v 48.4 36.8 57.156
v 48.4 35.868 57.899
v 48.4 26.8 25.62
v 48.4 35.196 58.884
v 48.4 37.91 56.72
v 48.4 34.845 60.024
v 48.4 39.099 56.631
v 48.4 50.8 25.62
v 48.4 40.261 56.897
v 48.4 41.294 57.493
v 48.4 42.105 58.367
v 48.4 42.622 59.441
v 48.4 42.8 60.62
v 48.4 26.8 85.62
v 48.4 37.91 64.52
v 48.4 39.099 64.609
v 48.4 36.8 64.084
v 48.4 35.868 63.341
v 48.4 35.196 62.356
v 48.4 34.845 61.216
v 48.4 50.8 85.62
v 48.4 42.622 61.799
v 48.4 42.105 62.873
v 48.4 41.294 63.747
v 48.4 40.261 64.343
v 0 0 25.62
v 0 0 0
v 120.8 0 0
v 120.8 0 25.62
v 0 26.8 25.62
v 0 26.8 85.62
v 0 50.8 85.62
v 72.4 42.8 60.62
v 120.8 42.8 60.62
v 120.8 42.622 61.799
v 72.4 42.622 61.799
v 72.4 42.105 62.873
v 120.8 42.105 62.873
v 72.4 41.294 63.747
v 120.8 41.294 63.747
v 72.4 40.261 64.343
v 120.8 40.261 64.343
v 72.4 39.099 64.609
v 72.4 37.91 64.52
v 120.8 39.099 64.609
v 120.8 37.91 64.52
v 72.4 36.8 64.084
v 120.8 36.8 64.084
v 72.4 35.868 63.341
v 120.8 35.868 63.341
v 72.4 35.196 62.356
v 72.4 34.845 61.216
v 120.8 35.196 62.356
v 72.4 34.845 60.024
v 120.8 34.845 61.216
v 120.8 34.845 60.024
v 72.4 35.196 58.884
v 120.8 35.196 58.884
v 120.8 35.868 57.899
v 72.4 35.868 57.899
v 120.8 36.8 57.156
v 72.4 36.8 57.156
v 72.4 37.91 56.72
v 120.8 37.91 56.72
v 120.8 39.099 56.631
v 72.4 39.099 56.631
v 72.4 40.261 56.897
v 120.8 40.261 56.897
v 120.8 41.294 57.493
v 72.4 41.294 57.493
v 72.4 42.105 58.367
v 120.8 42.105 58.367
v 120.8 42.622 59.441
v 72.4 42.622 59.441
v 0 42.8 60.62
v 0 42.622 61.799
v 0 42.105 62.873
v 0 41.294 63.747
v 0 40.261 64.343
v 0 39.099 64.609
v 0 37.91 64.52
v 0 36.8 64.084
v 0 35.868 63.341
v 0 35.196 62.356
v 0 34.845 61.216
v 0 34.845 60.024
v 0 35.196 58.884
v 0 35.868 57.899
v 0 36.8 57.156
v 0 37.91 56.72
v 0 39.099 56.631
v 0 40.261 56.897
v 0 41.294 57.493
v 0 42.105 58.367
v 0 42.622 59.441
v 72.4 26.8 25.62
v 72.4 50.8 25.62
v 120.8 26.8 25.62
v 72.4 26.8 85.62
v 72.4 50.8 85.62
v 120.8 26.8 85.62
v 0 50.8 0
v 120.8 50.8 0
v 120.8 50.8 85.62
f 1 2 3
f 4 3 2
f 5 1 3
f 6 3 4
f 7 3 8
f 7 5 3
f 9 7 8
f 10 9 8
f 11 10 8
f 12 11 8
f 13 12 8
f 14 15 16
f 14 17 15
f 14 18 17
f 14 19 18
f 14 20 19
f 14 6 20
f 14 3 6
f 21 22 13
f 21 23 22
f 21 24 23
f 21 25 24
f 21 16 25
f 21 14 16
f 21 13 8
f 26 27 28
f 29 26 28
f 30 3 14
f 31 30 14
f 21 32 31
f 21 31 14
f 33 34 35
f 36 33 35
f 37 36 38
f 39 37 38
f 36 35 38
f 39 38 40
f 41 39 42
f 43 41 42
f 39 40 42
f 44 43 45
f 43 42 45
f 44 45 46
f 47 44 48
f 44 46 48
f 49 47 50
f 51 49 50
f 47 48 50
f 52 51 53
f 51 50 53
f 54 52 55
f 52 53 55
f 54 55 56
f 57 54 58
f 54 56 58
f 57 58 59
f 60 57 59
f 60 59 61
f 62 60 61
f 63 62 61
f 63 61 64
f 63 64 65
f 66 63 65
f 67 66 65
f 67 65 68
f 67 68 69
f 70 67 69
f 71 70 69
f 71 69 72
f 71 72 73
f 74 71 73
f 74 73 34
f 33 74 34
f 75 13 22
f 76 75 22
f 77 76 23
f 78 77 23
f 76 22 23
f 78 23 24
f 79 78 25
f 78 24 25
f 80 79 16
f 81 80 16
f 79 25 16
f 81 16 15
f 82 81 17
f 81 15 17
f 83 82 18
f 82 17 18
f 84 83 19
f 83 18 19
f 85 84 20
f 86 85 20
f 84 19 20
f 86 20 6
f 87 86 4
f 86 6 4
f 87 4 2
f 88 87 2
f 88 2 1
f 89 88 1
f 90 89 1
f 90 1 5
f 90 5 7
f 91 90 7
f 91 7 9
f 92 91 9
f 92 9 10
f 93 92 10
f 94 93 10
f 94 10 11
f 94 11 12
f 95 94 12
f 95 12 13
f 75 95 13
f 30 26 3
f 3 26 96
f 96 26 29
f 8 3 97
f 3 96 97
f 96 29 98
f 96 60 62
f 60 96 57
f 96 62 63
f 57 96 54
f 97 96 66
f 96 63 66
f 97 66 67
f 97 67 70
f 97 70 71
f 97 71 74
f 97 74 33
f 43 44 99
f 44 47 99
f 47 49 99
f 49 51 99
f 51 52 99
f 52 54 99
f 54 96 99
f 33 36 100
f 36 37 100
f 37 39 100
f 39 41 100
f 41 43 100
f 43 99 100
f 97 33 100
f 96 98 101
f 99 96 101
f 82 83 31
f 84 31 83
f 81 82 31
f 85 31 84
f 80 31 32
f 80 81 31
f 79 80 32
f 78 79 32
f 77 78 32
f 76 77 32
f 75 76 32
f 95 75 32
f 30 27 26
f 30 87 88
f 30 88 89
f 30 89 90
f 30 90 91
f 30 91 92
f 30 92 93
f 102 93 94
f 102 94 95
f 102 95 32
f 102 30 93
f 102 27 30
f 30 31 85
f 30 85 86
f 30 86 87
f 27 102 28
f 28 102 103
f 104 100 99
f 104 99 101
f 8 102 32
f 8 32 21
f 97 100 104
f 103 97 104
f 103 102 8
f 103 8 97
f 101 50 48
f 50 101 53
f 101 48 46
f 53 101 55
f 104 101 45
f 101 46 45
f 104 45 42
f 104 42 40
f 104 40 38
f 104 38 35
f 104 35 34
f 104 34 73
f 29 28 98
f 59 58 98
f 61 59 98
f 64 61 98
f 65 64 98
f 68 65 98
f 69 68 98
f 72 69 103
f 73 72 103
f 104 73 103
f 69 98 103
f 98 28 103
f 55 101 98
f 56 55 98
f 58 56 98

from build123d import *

# Parameters (mm, degrees)
SKETCH1_W           = 120.8
SKETCH1_H           = 50.8
BOSS_EXTRUDE1_DEPTH = 85.62
SKETCH2_W           = 24
SKETCH2_H           = 50.8
CUT_EXTRUDE1_DEPTH  = 60
SKETCH3_R           = 4
CUT_EXTRUDE2_DEPTH  = 121.8
SKETCH4_W           = 26.8
SKETCH4_H           = 60
CUT_EXTRUDE3_DEPTH  = 121.8


with BuildPart() as part:
    # Sketch1 → Boss-Extrude1 (new body)
    with BuildSketch(Plane.XY):
        with Locations((60.4, 25.4)):
            Rectangle(SKETCH1_W, SKETCH1_H)
    extrude(amount=BOSS_EXTRUDE1_DEPTH)

    # Sketch2 → Cut-Extrude1 (cut)
    with BuildSketch(Plane.XY.offset(85.62)):
        with Locations((60.4, 25.4)):
            Rectangle(SKETCH2_W, SKETCH2_H)
    extrude(amount=-CUT_EXTRUDE1_DEPTH, mode=Mode.SUBTRACT)

    # Sketch3 → Cut-Extrude2 (cut, through all)
    with BuildSketch(Plane.YZ.offset(120.8)):
        with Locations((38.8, 60.62)):
            Circle(SKETCH3_R)
    extrude(amount=-CUT_EXTRUDE2_DEPTH, mode=Mode.SUBTRACT)

    # Sketch4 → Cut-Extrude3 (cut, through all)
    with BuildSketch(Plane.YZ.offset(120.8)):
        with Locations((13.4, 55.62)):
            Rectangle(SKETCH4_W, SKETCH4_H)
    extrude(amount=-CUT_EXTRUDE3_DEPTH, mode=Mode.SUBTRACT)


solid = part.part
